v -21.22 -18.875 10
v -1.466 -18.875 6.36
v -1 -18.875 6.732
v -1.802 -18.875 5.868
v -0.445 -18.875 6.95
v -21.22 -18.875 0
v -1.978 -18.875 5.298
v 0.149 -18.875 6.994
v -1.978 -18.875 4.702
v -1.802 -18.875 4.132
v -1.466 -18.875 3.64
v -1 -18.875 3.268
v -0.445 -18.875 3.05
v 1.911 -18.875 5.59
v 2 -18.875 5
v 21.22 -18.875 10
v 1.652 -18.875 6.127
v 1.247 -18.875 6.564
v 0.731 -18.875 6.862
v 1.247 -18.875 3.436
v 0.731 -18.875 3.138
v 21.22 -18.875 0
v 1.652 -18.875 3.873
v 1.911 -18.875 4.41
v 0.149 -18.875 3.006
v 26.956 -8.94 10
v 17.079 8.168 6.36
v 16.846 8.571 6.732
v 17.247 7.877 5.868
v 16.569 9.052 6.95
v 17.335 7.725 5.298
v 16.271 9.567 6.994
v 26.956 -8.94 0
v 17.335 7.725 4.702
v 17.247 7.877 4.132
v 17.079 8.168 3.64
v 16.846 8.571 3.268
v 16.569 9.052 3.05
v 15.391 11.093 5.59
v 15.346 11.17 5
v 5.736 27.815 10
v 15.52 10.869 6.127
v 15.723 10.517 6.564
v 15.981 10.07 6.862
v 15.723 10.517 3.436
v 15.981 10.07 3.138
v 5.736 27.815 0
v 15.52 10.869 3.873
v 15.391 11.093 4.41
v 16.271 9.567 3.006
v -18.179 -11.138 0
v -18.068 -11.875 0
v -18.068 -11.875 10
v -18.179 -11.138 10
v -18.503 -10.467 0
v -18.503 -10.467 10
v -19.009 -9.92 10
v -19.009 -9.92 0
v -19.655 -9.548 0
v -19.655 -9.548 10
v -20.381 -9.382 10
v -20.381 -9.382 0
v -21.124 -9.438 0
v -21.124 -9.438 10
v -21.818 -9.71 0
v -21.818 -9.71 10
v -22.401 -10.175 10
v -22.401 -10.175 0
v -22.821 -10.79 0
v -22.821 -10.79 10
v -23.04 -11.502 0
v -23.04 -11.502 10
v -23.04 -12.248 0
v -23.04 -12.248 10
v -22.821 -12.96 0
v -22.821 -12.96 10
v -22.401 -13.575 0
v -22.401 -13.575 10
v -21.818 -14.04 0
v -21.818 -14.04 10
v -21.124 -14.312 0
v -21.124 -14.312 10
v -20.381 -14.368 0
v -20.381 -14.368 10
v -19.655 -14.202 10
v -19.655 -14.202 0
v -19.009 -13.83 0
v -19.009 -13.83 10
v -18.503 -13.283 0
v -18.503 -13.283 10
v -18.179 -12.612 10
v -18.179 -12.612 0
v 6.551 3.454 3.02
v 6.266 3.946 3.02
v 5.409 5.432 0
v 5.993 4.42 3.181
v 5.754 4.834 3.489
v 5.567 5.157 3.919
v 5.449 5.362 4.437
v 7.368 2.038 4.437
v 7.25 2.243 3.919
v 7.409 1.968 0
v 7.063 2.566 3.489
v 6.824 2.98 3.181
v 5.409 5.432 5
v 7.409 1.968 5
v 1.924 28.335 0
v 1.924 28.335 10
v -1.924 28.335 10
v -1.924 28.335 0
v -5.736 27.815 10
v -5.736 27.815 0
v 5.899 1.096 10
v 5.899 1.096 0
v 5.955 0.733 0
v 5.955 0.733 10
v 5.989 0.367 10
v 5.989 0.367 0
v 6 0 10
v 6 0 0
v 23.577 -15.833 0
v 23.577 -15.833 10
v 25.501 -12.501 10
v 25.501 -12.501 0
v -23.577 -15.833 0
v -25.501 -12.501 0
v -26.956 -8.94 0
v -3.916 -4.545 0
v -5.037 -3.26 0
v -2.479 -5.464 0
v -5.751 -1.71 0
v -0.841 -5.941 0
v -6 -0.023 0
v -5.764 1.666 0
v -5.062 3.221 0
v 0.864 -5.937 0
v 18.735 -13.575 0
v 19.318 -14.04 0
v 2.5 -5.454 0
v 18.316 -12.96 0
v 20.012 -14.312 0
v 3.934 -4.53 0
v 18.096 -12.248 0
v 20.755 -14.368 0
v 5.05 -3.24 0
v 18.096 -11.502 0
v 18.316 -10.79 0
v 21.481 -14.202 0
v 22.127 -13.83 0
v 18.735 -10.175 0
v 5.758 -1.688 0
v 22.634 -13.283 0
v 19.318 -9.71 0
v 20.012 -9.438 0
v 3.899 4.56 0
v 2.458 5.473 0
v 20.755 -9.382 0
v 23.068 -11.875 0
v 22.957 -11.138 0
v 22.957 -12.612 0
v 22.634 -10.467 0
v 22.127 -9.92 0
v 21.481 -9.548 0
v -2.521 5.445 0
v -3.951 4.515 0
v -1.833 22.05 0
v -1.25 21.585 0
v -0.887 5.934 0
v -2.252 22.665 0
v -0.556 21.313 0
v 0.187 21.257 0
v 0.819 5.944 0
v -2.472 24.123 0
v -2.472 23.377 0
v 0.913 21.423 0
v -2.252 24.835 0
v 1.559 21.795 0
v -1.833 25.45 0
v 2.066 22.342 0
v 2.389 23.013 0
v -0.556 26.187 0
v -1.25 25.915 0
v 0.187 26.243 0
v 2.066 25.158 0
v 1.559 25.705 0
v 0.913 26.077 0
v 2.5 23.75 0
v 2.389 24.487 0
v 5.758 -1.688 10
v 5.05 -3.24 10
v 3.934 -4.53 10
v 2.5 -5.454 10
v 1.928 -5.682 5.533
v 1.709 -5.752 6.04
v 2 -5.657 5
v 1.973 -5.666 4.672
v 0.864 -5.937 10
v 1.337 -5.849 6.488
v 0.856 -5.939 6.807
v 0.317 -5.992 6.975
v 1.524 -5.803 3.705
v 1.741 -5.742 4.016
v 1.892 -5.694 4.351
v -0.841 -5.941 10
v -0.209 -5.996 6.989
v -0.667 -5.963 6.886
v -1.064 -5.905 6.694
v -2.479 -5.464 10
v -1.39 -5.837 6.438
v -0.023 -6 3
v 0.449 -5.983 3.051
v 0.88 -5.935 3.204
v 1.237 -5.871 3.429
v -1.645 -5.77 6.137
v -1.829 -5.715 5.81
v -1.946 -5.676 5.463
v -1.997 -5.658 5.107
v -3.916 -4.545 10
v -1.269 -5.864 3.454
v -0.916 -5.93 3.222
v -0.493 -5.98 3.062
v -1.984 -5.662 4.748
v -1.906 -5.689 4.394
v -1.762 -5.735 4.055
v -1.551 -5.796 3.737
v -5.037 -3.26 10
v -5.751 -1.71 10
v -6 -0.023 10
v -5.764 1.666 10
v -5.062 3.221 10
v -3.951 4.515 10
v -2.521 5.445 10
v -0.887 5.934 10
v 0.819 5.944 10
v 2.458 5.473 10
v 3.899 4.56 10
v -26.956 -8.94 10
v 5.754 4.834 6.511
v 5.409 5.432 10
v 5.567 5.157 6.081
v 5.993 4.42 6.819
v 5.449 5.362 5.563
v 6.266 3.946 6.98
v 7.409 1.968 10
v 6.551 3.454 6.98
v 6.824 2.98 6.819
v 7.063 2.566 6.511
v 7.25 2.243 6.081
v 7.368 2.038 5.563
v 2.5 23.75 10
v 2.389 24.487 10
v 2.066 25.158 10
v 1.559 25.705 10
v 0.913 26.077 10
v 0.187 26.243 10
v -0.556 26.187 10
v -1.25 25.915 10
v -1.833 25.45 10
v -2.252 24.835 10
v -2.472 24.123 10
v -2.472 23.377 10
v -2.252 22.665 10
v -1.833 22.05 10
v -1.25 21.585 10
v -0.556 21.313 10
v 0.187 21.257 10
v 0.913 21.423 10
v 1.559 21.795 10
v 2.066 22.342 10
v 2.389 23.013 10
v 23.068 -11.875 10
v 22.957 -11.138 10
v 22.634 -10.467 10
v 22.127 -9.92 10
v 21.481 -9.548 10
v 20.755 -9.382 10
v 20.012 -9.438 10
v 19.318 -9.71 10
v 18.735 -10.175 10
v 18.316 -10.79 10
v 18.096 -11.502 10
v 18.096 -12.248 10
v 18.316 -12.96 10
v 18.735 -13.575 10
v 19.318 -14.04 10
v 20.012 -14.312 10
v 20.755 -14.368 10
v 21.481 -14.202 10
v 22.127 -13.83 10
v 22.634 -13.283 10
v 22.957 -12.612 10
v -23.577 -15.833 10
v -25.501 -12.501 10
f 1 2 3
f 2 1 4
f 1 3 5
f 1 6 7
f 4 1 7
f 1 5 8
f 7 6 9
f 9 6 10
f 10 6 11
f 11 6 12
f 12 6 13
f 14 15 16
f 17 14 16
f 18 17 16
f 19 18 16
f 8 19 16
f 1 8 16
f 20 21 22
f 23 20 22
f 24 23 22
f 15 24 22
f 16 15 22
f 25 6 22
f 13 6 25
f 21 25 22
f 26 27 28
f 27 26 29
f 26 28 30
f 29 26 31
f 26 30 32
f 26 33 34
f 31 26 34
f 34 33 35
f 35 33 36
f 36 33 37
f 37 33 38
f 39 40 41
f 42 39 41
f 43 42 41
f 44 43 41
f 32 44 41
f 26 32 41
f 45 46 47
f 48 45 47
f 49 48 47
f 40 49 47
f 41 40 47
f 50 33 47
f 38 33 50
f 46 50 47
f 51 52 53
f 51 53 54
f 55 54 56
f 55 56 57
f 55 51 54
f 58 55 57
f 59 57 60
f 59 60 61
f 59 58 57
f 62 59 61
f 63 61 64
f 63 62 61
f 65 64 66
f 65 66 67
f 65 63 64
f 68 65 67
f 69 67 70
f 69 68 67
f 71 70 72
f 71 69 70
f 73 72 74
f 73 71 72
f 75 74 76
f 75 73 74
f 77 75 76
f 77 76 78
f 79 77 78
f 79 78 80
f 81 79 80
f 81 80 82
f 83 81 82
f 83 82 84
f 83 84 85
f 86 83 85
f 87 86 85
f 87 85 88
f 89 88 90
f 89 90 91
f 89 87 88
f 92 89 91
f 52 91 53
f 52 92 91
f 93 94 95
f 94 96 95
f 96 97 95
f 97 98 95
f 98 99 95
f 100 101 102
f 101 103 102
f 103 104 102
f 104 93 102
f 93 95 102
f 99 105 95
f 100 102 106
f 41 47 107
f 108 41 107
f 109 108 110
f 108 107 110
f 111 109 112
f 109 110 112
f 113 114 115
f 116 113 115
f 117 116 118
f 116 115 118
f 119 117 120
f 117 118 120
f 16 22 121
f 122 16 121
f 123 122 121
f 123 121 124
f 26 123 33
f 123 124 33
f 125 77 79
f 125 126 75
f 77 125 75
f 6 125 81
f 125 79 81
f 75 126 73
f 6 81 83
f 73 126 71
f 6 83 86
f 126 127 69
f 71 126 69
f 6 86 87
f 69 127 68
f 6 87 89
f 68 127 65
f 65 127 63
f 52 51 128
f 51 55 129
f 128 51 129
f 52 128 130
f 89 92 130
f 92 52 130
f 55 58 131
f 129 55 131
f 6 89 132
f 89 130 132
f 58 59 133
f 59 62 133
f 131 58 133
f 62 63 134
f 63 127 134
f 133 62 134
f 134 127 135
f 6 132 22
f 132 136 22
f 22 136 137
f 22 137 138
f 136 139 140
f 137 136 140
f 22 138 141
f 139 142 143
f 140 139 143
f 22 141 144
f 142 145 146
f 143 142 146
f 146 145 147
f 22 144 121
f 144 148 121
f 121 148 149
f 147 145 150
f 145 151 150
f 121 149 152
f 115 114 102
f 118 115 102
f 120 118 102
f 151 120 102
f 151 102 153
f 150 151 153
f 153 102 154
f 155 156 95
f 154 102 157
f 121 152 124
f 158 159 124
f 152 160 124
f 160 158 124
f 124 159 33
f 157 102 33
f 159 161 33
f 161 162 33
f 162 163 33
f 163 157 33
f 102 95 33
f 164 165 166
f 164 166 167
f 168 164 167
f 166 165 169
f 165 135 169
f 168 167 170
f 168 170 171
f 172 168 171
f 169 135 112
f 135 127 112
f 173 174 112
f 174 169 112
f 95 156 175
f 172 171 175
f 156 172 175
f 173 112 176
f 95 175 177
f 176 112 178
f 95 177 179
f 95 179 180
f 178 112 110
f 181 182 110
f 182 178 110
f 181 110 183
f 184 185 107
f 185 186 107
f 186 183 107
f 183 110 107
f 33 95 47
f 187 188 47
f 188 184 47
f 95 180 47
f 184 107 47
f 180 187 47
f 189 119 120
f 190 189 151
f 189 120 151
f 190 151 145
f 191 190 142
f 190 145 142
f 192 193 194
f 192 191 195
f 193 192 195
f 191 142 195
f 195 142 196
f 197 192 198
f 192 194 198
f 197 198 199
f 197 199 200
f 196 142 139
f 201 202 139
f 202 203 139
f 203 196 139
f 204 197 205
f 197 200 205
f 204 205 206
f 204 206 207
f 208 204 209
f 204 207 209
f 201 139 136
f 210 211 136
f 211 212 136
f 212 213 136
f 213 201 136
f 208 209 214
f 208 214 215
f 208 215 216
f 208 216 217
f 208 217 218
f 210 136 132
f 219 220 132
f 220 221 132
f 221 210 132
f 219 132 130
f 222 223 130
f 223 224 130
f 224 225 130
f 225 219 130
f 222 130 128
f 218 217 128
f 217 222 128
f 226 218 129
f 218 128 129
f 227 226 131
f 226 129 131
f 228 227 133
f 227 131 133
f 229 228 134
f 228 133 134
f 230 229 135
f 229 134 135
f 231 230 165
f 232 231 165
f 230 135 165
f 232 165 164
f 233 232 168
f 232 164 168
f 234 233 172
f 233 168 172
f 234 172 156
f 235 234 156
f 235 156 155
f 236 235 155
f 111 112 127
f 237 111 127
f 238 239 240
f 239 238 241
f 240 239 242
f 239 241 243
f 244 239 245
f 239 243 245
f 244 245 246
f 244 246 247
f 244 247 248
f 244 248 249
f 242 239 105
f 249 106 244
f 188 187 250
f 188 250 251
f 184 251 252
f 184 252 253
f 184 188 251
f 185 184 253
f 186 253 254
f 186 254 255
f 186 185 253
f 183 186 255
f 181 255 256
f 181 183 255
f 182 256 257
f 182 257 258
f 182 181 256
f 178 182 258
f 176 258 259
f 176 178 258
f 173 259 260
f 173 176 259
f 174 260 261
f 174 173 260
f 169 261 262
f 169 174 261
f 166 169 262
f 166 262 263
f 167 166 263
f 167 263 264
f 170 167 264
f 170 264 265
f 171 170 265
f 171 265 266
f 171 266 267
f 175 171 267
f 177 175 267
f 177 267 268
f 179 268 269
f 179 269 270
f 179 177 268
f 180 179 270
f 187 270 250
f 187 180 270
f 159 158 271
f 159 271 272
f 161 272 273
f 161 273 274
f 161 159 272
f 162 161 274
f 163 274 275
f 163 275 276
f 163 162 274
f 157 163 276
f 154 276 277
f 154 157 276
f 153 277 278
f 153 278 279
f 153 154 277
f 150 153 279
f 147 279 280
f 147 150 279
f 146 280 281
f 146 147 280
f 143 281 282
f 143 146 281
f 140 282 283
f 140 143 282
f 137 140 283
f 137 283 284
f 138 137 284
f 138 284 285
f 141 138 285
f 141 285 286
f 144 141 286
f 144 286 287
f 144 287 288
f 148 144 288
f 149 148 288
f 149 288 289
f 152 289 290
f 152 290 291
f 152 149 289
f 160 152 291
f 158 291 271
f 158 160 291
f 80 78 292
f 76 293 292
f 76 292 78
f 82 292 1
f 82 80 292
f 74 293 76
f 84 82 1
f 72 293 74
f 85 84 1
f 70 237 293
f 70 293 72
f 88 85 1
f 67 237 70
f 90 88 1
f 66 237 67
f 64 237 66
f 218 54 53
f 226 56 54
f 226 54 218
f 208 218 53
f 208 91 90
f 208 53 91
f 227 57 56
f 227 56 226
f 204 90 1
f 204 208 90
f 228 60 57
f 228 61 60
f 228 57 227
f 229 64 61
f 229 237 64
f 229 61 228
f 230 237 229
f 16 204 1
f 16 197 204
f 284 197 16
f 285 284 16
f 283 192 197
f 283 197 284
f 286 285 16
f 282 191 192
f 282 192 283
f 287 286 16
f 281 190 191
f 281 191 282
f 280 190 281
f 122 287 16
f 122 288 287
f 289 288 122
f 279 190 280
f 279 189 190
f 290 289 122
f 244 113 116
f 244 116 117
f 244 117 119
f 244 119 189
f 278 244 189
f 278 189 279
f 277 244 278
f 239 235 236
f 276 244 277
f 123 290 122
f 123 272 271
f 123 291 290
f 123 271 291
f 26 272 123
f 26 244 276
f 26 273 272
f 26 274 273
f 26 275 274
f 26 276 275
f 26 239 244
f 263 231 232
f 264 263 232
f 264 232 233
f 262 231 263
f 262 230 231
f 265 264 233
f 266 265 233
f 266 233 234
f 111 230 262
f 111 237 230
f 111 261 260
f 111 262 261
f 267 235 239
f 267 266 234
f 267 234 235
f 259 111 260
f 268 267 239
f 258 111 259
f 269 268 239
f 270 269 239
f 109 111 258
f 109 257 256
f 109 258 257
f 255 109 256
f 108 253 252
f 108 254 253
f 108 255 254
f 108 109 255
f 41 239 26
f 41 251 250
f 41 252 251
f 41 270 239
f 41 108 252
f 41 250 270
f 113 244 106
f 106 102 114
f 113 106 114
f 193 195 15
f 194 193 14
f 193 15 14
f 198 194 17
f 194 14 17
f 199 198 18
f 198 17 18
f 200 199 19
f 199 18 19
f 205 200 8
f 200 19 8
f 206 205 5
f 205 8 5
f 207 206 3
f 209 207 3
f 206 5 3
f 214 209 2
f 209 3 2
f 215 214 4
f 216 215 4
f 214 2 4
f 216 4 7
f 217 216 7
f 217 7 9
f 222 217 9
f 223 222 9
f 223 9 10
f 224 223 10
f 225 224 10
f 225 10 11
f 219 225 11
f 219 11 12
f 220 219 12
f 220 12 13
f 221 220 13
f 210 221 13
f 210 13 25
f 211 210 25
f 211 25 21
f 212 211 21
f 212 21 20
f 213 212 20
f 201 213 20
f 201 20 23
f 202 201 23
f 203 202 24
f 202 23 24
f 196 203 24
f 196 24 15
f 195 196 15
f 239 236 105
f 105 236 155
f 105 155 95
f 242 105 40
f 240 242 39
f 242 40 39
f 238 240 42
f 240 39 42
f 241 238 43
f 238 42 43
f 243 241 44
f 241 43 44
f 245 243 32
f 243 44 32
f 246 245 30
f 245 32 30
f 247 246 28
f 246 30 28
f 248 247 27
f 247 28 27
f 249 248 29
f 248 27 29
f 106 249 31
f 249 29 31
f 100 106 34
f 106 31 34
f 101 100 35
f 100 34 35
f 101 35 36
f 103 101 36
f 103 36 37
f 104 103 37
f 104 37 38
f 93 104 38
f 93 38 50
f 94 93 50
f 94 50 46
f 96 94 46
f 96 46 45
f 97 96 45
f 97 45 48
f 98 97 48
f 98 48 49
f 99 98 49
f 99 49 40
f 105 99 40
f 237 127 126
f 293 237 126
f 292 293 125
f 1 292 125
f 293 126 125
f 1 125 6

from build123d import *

# Parameters (mm, degrees)
SKETCH_1_R          = 2.5
EXTRUDE_1_DEPTH     = 10
SKETCH_2_R          = 2
CUT_EXTRUDE_1_DEPTH = 15
SKETCH_3_R          = 2
CUT_EXTRUDE_2_DEPTH = 15


with BuildPart() as part:
    # ｽｹｯﾁ1 → ﾎﾞｽ - 押し出し1 (new body)
    with BuildSketch(Plane.XY):
        with BuildLine():
            ThreePointArc((5.736159103, 27.814680993), (0, 28.4), (-5.736159103, 27.814680993))
            Line((-5.736159103, 27.814680993), (-26.95629989, -8.939680993))
            ThreePointArc((-26.95629989, -8.939680993), (-24.595121467, -14.2), (-21.220140787, -18.875))
            Line((-21.220140787, -18.875), (21.220140787, -18.875))
            ThreePointArc((21.220140787, -18.875), (24.595121467, -14.2), (26.95629989, -8.939680993))
            Line((26.95629989, -8.939680993), (5.736159103, 27.814680993))
        make_face()
        with Locations((-20.56810334, -11.875)):
            Circle(SKETCH_1_R, mode=Mode.SUBTRACT)
        with Locations((20.56810334, -11.875)):
            Circle(SKETCH_1_R, mode=Mode.SUBTRACT)
        with BuildLine():
            ThreePointArc((6, 0), (-5.449489743, -2.51058988), (3.898979486, 4.560477932))
            Line((3.898979486, 4.560477932), (5.408587988, 5.432050808))
            Line((5.408587988, 5.432050808), (7.408587988, 1.967949192))
            Line((7.408587988, 1.967949192), (5.898979486, 1.096376317))
            ThreePointArc((5.898979486, 1.096376317), (5.974691495, 0.550510257), (6, 0))
        make_face(mode=Mode.SUBTRACT)
        with Locations((0, 23.75)):
            Circle(SKETCH_1_R, mode=Mode.SUBTRACT)
    extrude(amount=EXTRUDE_1_DEPTH)

    # ｽｹｯﾁ2 → ｶｯﾄ - 押し出し1 (cut)
    with BuildSketch(Plane(origin=(16.346229496, 9.4375, 0), x_dir=(0, 0, -1), z_dir=(0.8660254037844386, 0.5, 0))):
        with Locations(Location((-5, 0, 0), (0, 0, 90))):
            Circle(SKETCH_2_R)
    extrude(amount=-CUT_EXTRUDE_1_DEPTH, mode=Mode.SUBTRACT)

    # ｽｹｯﾁ3 → ｶｯﾄ - 押し出し2 (cut)
    with BuildSketch(Plane.XZ.offset(18.875)):
        with Locations((0, 5)):
            Circle(SKETCH_3_R)
    extrude(amount=-CUT_EXTRUDE_2_DEPTH, mode=Mode.SUBTRACT)


solid = part.part
